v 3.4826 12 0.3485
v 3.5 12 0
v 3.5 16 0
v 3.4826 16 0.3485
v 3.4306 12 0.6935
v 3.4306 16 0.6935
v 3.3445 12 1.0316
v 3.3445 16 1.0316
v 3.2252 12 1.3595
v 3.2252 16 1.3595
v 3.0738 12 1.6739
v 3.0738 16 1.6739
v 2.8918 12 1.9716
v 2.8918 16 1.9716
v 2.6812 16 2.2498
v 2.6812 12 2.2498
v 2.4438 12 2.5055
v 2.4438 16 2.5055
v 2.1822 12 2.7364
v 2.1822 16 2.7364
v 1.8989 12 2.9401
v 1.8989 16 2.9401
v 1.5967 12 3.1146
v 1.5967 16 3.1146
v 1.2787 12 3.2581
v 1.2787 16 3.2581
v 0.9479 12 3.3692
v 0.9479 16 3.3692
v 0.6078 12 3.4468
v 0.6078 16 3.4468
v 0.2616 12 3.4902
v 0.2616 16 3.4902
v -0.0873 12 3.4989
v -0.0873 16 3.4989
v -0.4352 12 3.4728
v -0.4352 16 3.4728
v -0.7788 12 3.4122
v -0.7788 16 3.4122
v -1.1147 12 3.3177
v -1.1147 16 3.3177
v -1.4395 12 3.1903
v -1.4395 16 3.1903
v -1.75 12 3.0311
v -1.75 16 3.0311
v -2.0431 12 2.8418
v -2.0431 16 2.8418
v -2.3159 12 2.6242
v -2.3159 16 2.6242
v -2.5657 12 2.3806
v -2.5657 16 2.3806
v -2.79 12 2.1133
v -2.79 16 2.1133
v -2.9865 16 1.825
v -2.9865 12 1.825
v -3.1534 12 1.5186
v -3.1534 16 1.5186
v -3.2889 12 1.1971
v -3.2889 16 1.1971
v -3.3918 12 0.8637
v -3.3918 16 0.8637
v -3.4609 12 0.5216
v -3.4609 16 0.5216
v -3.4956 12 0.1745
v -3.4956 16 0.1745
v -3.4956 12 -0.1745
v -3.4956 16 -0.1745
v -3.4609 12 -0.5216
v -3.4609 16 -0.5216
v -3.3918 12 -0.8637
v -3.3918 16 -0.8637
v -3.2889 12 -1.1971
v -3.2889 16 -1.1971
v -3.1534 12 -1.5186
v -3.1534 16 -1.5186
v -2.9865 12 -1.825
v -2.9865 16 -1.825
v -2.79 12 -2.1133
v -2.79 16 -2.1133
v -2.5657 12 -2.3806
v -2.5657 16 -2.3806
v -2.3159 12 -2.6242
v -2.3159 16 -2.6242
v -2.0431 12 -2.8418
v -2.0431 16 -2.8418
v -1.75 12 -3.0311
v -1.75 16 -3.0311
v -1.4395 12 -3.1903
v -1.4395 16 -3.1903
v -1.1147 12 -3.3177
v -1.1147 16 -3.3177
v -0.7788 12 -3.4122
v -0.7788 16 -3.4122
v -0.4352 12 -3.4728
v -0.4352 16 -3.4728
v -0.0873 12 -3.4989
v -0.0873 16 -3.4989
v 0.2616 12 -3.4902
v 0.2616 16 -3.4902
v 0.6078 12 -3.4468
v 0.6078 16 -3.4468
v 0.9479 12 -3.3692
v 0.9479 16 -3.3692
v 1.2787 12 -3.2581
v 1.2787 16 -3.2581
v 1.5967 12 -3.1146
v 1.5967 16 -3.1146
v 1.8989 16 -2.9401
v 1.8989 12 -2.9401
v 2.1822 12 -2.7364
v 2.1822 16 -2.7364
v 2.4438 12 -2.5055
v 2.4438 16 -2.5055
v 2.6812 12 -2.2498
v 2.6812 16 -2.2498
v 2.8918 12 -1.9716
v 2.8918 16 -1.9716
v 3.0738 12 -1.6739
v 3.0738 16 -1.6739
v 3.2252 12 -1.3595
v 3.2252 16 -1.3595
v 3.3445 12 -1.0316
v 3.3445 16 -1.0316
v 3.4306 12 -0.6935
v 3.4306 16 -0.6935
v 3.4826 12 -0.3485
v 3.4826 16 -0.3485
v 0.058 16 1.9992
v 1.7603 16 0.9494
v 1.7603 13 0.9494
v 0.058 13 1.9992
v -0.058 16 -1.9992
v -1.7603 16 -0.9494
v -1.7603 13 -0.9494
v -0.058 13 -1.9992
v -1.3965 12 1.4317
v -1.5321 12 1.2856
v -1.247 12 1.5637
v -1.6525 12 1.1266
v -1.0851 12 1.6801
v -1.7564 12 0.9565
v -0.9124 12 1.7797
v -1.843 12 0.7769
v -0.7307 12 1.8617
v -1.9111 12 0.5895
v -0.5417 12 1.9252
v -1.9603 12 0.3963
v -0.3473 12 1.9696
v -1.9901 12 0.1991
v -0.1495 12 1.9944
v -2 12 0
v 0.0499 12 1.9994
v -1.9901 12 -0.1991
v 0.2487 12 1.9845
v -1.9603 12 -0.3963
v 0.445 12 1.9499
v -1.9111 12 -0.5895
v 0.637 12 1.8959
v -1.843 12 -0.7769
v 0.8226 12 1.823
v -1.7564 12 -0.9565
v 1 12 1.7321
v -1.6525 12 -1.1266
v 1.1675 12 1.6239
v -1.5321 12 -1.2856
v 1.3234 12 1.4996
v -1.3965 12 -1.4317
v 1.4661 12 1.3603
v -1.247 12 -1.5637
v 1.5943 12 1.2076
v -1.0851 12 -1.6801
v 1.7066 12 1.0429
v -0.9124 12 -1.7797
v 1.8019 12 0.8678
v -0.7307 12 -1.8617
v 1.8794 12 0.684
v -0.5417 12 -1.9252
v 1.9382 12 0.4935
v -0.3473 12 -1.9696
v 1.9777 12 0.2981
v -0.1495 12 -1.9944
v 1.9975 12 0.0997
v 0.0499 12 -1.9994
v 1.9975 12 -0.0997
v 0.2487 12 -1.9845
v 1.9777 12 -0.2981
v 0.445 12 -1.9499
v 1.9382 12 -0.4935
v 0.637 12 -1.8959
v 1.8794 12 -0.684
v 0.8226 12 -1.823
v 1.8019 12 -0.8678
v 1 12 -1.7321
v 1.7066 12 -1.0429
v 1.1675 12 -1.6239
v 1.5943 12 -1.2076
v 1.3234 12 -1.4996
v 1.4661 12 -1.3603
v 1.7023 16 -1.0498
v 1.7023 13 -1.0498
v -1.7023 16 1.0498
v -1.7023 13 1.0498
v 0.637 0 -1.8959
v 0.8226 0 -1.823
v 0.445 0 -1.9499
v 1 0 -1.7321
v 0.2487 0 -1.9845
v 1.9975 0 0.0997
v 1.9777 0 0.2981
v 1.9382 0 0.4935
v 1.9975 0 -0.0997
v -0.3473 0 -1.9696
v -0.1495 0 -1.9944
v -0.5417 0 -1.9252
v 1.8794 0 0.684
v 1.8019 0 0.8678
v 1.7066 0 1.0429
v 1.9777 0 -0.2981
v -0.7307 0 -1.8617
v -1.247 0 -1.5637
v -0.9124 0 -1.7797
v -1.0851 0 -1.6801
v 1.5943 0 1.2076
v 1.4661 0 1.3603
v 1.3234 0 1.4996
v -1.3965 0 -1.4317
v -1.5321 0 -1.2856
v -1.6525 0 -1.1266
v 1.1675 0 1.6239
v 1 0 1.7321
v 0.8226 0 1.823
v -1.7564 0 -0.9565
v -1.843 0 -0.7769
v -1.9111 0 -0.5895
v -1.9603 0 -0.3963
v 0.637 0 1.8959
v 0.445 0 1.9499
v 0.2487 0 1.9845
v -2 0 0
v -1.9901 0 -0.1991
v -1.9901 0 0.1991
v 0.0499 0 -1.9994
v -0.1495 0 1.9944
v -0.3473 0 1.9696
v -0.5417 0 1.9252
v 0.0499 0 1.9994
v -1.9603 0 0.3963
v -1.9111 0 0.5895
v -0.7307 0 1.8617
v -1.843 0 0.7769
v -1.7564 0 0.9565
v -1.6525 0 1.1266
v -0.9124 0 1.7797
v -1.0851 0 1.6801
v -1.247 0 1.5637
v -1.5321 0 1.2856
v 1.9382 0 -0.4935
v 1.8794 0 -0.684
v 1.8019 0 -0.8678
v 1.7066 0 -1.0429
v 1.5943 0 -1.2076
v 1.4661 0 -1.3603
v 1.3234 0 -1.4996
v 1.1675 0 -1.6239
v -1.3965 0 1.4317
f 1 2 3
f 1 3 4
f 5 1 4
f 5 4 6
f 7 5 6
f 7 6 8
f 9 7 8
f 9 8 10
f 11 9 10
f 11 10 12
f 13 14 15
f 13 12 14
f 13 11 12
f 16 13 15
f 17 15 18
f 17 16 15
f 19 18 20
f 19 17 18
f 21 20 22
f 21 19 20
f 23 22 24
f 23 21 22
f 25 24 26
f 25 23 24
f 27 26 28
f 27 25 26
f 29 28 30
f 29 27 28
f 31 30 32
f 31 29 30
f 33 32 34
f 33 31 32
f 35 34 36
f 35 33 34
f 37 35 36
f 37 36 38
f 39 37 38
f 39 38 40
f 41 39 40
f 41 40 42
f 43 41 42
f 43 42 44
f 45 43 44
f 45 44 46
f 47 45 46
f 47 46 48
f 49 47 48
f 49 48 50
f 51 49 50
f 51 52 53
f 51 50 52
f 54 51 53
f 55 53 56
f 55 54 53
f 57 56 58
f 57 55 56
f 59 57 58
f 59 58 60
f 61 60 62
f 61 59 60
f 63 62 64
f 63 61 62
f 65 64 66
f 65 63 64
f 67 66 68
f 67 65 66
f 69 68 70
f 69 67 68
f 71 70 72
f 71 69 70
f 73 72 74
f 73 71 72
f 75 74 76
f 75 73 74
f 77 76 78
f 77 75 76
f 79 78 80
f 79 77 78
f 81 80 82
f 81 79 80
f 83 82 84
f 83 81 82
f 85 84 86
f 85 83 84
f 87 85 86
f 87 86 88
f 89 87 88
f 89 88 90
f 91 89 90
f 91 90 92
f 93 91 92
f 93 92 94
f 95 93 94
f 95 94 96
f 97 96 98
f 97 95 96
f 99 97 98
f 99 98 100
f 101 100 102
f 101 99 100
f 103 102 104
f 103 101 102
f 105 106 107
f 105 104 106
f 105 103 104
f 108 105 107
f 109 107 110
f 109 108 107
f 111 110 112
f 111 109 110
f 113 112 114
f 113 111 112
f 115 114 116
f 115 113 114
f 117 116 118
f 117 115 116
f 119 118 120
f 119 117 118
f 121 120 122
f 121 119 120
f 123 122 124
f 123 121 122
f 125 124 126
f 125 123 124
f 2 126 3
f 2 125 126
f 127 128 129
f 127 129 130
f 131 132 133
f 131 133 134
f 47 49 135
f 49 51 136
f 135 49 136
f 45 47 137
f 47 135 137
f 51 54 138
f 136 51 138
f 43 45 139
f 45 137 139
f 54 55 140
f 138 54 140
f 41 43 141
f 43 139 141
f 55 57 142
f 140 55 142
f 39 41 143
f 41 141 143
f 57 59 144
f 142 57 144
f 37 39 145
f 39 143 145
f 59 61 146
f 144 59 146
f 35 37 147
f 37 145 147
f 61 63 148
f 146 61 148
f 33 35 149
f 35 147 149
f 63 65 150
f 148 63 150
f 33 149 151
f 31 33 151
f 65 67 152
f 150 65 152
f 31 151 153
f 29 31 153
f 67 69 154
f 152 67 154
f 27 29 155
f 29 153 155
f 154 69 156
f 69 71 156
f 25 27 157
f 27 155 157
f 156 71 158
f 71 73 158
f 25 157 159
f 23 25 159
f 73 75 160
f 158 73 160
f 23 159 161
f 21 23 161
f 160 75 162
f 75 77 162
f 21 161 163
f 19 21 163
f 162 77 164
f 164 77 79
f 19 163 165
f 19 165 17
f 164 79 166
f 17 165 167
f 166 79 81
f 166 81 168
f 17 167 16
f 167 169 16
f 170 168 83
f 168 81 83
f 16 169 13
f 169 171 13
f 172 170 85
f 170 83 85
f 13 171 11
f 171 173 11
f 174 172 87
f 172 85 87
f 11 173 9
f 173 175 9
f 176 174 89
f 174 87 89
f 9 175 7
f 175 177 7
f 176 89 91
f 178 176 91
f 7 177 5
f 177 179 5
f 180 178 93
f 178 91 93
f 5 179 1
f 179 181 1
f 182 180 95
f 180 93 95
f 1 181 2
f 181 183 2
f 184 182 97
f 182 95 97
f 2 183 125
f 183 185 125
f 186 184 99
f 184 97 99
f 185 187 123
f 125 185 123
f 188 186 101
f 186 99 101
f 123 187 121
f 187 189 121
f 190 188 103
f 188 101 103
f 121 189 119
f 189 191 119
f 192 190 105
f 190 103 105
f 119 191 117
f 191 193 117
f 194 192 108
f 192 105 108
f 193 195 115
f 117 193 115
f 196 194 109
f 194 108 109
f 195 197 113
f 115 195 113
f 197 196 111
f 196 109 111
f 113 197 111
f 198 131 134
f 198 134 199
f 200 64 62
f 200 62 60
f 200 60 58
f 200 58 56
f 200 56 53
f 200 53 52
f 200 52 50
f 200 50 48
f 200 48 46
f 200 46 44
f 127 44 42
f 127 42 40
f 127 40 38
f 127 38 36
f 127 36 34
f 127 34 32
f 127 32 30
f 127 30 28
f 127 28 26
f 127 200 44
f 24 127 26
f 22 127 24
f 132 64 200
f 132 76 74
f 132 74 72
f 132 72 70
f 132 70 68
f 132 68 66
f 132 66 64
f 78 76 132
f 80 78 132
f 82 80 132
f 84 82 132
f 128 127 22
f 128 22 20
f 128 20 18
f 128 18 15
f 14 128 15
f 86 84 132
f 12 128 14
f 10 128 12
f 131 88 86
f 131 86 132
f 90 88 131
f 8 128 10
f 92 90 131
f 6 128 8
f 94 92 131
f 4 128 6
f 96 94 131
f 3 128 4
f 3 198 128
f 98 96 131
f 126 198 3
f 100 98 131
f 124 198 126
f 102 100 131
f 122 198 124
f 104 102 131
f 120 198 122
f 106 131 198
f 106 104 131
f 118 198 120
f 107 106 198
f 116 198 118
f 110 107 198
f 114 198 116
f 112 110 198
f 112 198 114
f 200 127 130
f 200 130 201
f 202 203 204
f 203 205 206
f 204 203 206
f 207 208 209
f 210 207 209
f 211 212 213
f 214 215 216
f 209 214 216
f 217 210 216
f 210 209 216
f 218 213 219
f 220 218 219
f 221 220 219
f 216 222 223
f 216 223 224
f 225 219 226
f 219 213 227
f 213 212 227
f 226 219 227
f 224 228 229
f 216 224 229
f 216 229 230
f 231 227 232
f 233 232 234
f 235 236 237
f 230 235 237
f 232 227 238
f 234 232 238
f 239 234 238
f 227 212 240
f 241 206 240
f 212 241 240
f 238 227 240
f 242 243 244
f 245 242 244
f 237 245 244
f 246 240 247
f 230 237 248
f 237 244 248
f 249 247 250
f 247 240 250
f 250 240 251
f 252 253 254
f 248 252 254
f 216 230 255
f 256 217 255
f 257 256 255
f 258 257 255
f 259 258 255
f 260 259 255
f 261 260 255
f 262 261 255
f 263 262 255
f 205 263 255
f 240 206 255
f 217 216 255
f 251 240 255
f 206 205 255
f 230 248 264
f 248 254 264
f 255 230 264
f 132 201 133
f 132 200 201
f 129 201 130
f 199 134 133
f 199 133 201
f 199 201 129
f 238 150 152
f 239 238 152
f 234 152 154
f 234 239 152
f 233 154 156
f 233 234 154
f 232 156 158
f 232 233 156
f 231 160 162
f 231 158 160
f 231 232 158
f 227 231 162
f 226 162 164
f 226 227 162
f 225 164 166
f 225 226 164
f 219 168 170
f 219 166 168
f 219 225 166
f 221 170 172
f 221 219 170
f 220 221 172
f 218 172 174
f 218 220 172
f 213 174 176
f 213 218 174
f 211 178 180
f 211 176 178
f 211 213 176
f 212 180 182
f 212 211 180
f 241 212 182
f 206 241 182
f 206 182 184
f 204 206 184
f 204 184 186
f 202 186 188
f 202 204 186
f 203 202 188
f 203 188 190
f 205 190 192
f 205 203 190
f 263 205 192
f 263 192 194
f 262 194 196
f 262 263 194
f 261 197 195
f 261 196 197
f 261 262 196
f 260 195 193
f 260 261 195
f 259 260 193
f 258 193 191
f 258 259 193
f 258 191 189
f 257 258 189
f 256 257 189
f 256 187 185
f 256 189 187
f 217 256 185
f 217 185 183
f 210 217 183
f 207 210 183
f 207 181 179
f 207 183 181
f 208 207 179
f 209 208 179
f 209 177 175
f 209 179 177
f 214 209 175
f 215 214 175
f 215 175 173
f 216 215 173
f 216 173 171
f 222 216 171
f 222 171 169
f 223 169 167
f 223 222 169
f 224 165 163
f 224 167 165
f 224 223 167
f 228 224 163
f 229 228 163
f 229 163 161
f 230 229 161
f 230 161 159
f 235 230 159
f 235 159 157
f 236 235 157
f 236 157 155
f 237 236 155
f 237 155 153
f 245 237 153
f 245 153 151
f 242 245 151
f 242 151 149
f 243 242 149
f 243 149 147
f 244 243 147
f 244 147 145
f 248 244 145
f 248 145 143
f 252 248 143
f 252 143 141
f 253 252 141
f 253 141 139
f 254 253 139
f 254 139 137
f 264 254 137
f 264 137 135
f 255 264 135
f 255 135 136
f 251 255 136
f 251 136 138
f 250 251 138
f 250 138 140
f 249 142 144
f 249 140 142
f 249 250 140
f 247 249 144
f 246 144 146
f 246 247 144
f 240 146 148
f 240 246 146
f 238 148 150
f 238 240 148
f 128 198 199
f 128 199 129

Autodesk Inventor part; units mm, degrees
ref_plane "YZ Plane" through (0, 0, 0) normal (1, 0, 0) x (0, 1, 0)
ref_plane "XZ Plane" through (0, 0, 0) normal (0, 1, 0) x (-1, 0, 0)
ref_plane "XY Plane" through (0, 0, 0) normal (0, 0, 1) x (1, 0, 0)
sketch "Sketch1" plane through (0, 0, 0) normal (0, 1, 0) x (-1, 0, 0)
  circle A0 centre (0, 0) radius 2
  dimension "d0" = 4
extrude "Extrusion1" add sketch "Sketch1" along normal blind 12
sketch "Sketch2" plane through (0, 12, 0) normal (0, 1, 0) x (1, 0, 0)
  circle A0 centre (0, 0) radius 3.5
  dimension "d5" = 7
thread "Thread1" size "M4x0.7" class "6g" standard "ANSI Metric M Profile" full length
extrude "Extrusion2" add sketch "Sketch2" along normal blind 4
sketch "Sketch3" plane through (0, 16, 0) normal (0, 1, 0) x (1, 0, 0)
  circle A0 centre (0, 0) radius 3.5 projected
  circle A1 centre (0, 0) radius 2 projected
  line L0 (-1.7603, 0.9494) -> (-0.058, 1.9992)
  line L1 (-0.058, 1.9992) -> (1.7023, 1.0498)
  line L2 (1.7023, 1.0498) -> (1.7603, -0.9494)
  line L3 (1.7603, -0.9494) -> (0.058, -1.9992)
  line L4 (0.058, -1.9992) -> (-1.7023, -1.0498)
  line L5 (-1.7023, -1.0498) -> (-1.7603, 0.9494)
extrude "Extrusion3" cut sketch "Sketch3" against normal blind 3 contours L2 L3 L4 L5 L0 L1
properties part number "M4_12mm" material "Steel, Alloy"
